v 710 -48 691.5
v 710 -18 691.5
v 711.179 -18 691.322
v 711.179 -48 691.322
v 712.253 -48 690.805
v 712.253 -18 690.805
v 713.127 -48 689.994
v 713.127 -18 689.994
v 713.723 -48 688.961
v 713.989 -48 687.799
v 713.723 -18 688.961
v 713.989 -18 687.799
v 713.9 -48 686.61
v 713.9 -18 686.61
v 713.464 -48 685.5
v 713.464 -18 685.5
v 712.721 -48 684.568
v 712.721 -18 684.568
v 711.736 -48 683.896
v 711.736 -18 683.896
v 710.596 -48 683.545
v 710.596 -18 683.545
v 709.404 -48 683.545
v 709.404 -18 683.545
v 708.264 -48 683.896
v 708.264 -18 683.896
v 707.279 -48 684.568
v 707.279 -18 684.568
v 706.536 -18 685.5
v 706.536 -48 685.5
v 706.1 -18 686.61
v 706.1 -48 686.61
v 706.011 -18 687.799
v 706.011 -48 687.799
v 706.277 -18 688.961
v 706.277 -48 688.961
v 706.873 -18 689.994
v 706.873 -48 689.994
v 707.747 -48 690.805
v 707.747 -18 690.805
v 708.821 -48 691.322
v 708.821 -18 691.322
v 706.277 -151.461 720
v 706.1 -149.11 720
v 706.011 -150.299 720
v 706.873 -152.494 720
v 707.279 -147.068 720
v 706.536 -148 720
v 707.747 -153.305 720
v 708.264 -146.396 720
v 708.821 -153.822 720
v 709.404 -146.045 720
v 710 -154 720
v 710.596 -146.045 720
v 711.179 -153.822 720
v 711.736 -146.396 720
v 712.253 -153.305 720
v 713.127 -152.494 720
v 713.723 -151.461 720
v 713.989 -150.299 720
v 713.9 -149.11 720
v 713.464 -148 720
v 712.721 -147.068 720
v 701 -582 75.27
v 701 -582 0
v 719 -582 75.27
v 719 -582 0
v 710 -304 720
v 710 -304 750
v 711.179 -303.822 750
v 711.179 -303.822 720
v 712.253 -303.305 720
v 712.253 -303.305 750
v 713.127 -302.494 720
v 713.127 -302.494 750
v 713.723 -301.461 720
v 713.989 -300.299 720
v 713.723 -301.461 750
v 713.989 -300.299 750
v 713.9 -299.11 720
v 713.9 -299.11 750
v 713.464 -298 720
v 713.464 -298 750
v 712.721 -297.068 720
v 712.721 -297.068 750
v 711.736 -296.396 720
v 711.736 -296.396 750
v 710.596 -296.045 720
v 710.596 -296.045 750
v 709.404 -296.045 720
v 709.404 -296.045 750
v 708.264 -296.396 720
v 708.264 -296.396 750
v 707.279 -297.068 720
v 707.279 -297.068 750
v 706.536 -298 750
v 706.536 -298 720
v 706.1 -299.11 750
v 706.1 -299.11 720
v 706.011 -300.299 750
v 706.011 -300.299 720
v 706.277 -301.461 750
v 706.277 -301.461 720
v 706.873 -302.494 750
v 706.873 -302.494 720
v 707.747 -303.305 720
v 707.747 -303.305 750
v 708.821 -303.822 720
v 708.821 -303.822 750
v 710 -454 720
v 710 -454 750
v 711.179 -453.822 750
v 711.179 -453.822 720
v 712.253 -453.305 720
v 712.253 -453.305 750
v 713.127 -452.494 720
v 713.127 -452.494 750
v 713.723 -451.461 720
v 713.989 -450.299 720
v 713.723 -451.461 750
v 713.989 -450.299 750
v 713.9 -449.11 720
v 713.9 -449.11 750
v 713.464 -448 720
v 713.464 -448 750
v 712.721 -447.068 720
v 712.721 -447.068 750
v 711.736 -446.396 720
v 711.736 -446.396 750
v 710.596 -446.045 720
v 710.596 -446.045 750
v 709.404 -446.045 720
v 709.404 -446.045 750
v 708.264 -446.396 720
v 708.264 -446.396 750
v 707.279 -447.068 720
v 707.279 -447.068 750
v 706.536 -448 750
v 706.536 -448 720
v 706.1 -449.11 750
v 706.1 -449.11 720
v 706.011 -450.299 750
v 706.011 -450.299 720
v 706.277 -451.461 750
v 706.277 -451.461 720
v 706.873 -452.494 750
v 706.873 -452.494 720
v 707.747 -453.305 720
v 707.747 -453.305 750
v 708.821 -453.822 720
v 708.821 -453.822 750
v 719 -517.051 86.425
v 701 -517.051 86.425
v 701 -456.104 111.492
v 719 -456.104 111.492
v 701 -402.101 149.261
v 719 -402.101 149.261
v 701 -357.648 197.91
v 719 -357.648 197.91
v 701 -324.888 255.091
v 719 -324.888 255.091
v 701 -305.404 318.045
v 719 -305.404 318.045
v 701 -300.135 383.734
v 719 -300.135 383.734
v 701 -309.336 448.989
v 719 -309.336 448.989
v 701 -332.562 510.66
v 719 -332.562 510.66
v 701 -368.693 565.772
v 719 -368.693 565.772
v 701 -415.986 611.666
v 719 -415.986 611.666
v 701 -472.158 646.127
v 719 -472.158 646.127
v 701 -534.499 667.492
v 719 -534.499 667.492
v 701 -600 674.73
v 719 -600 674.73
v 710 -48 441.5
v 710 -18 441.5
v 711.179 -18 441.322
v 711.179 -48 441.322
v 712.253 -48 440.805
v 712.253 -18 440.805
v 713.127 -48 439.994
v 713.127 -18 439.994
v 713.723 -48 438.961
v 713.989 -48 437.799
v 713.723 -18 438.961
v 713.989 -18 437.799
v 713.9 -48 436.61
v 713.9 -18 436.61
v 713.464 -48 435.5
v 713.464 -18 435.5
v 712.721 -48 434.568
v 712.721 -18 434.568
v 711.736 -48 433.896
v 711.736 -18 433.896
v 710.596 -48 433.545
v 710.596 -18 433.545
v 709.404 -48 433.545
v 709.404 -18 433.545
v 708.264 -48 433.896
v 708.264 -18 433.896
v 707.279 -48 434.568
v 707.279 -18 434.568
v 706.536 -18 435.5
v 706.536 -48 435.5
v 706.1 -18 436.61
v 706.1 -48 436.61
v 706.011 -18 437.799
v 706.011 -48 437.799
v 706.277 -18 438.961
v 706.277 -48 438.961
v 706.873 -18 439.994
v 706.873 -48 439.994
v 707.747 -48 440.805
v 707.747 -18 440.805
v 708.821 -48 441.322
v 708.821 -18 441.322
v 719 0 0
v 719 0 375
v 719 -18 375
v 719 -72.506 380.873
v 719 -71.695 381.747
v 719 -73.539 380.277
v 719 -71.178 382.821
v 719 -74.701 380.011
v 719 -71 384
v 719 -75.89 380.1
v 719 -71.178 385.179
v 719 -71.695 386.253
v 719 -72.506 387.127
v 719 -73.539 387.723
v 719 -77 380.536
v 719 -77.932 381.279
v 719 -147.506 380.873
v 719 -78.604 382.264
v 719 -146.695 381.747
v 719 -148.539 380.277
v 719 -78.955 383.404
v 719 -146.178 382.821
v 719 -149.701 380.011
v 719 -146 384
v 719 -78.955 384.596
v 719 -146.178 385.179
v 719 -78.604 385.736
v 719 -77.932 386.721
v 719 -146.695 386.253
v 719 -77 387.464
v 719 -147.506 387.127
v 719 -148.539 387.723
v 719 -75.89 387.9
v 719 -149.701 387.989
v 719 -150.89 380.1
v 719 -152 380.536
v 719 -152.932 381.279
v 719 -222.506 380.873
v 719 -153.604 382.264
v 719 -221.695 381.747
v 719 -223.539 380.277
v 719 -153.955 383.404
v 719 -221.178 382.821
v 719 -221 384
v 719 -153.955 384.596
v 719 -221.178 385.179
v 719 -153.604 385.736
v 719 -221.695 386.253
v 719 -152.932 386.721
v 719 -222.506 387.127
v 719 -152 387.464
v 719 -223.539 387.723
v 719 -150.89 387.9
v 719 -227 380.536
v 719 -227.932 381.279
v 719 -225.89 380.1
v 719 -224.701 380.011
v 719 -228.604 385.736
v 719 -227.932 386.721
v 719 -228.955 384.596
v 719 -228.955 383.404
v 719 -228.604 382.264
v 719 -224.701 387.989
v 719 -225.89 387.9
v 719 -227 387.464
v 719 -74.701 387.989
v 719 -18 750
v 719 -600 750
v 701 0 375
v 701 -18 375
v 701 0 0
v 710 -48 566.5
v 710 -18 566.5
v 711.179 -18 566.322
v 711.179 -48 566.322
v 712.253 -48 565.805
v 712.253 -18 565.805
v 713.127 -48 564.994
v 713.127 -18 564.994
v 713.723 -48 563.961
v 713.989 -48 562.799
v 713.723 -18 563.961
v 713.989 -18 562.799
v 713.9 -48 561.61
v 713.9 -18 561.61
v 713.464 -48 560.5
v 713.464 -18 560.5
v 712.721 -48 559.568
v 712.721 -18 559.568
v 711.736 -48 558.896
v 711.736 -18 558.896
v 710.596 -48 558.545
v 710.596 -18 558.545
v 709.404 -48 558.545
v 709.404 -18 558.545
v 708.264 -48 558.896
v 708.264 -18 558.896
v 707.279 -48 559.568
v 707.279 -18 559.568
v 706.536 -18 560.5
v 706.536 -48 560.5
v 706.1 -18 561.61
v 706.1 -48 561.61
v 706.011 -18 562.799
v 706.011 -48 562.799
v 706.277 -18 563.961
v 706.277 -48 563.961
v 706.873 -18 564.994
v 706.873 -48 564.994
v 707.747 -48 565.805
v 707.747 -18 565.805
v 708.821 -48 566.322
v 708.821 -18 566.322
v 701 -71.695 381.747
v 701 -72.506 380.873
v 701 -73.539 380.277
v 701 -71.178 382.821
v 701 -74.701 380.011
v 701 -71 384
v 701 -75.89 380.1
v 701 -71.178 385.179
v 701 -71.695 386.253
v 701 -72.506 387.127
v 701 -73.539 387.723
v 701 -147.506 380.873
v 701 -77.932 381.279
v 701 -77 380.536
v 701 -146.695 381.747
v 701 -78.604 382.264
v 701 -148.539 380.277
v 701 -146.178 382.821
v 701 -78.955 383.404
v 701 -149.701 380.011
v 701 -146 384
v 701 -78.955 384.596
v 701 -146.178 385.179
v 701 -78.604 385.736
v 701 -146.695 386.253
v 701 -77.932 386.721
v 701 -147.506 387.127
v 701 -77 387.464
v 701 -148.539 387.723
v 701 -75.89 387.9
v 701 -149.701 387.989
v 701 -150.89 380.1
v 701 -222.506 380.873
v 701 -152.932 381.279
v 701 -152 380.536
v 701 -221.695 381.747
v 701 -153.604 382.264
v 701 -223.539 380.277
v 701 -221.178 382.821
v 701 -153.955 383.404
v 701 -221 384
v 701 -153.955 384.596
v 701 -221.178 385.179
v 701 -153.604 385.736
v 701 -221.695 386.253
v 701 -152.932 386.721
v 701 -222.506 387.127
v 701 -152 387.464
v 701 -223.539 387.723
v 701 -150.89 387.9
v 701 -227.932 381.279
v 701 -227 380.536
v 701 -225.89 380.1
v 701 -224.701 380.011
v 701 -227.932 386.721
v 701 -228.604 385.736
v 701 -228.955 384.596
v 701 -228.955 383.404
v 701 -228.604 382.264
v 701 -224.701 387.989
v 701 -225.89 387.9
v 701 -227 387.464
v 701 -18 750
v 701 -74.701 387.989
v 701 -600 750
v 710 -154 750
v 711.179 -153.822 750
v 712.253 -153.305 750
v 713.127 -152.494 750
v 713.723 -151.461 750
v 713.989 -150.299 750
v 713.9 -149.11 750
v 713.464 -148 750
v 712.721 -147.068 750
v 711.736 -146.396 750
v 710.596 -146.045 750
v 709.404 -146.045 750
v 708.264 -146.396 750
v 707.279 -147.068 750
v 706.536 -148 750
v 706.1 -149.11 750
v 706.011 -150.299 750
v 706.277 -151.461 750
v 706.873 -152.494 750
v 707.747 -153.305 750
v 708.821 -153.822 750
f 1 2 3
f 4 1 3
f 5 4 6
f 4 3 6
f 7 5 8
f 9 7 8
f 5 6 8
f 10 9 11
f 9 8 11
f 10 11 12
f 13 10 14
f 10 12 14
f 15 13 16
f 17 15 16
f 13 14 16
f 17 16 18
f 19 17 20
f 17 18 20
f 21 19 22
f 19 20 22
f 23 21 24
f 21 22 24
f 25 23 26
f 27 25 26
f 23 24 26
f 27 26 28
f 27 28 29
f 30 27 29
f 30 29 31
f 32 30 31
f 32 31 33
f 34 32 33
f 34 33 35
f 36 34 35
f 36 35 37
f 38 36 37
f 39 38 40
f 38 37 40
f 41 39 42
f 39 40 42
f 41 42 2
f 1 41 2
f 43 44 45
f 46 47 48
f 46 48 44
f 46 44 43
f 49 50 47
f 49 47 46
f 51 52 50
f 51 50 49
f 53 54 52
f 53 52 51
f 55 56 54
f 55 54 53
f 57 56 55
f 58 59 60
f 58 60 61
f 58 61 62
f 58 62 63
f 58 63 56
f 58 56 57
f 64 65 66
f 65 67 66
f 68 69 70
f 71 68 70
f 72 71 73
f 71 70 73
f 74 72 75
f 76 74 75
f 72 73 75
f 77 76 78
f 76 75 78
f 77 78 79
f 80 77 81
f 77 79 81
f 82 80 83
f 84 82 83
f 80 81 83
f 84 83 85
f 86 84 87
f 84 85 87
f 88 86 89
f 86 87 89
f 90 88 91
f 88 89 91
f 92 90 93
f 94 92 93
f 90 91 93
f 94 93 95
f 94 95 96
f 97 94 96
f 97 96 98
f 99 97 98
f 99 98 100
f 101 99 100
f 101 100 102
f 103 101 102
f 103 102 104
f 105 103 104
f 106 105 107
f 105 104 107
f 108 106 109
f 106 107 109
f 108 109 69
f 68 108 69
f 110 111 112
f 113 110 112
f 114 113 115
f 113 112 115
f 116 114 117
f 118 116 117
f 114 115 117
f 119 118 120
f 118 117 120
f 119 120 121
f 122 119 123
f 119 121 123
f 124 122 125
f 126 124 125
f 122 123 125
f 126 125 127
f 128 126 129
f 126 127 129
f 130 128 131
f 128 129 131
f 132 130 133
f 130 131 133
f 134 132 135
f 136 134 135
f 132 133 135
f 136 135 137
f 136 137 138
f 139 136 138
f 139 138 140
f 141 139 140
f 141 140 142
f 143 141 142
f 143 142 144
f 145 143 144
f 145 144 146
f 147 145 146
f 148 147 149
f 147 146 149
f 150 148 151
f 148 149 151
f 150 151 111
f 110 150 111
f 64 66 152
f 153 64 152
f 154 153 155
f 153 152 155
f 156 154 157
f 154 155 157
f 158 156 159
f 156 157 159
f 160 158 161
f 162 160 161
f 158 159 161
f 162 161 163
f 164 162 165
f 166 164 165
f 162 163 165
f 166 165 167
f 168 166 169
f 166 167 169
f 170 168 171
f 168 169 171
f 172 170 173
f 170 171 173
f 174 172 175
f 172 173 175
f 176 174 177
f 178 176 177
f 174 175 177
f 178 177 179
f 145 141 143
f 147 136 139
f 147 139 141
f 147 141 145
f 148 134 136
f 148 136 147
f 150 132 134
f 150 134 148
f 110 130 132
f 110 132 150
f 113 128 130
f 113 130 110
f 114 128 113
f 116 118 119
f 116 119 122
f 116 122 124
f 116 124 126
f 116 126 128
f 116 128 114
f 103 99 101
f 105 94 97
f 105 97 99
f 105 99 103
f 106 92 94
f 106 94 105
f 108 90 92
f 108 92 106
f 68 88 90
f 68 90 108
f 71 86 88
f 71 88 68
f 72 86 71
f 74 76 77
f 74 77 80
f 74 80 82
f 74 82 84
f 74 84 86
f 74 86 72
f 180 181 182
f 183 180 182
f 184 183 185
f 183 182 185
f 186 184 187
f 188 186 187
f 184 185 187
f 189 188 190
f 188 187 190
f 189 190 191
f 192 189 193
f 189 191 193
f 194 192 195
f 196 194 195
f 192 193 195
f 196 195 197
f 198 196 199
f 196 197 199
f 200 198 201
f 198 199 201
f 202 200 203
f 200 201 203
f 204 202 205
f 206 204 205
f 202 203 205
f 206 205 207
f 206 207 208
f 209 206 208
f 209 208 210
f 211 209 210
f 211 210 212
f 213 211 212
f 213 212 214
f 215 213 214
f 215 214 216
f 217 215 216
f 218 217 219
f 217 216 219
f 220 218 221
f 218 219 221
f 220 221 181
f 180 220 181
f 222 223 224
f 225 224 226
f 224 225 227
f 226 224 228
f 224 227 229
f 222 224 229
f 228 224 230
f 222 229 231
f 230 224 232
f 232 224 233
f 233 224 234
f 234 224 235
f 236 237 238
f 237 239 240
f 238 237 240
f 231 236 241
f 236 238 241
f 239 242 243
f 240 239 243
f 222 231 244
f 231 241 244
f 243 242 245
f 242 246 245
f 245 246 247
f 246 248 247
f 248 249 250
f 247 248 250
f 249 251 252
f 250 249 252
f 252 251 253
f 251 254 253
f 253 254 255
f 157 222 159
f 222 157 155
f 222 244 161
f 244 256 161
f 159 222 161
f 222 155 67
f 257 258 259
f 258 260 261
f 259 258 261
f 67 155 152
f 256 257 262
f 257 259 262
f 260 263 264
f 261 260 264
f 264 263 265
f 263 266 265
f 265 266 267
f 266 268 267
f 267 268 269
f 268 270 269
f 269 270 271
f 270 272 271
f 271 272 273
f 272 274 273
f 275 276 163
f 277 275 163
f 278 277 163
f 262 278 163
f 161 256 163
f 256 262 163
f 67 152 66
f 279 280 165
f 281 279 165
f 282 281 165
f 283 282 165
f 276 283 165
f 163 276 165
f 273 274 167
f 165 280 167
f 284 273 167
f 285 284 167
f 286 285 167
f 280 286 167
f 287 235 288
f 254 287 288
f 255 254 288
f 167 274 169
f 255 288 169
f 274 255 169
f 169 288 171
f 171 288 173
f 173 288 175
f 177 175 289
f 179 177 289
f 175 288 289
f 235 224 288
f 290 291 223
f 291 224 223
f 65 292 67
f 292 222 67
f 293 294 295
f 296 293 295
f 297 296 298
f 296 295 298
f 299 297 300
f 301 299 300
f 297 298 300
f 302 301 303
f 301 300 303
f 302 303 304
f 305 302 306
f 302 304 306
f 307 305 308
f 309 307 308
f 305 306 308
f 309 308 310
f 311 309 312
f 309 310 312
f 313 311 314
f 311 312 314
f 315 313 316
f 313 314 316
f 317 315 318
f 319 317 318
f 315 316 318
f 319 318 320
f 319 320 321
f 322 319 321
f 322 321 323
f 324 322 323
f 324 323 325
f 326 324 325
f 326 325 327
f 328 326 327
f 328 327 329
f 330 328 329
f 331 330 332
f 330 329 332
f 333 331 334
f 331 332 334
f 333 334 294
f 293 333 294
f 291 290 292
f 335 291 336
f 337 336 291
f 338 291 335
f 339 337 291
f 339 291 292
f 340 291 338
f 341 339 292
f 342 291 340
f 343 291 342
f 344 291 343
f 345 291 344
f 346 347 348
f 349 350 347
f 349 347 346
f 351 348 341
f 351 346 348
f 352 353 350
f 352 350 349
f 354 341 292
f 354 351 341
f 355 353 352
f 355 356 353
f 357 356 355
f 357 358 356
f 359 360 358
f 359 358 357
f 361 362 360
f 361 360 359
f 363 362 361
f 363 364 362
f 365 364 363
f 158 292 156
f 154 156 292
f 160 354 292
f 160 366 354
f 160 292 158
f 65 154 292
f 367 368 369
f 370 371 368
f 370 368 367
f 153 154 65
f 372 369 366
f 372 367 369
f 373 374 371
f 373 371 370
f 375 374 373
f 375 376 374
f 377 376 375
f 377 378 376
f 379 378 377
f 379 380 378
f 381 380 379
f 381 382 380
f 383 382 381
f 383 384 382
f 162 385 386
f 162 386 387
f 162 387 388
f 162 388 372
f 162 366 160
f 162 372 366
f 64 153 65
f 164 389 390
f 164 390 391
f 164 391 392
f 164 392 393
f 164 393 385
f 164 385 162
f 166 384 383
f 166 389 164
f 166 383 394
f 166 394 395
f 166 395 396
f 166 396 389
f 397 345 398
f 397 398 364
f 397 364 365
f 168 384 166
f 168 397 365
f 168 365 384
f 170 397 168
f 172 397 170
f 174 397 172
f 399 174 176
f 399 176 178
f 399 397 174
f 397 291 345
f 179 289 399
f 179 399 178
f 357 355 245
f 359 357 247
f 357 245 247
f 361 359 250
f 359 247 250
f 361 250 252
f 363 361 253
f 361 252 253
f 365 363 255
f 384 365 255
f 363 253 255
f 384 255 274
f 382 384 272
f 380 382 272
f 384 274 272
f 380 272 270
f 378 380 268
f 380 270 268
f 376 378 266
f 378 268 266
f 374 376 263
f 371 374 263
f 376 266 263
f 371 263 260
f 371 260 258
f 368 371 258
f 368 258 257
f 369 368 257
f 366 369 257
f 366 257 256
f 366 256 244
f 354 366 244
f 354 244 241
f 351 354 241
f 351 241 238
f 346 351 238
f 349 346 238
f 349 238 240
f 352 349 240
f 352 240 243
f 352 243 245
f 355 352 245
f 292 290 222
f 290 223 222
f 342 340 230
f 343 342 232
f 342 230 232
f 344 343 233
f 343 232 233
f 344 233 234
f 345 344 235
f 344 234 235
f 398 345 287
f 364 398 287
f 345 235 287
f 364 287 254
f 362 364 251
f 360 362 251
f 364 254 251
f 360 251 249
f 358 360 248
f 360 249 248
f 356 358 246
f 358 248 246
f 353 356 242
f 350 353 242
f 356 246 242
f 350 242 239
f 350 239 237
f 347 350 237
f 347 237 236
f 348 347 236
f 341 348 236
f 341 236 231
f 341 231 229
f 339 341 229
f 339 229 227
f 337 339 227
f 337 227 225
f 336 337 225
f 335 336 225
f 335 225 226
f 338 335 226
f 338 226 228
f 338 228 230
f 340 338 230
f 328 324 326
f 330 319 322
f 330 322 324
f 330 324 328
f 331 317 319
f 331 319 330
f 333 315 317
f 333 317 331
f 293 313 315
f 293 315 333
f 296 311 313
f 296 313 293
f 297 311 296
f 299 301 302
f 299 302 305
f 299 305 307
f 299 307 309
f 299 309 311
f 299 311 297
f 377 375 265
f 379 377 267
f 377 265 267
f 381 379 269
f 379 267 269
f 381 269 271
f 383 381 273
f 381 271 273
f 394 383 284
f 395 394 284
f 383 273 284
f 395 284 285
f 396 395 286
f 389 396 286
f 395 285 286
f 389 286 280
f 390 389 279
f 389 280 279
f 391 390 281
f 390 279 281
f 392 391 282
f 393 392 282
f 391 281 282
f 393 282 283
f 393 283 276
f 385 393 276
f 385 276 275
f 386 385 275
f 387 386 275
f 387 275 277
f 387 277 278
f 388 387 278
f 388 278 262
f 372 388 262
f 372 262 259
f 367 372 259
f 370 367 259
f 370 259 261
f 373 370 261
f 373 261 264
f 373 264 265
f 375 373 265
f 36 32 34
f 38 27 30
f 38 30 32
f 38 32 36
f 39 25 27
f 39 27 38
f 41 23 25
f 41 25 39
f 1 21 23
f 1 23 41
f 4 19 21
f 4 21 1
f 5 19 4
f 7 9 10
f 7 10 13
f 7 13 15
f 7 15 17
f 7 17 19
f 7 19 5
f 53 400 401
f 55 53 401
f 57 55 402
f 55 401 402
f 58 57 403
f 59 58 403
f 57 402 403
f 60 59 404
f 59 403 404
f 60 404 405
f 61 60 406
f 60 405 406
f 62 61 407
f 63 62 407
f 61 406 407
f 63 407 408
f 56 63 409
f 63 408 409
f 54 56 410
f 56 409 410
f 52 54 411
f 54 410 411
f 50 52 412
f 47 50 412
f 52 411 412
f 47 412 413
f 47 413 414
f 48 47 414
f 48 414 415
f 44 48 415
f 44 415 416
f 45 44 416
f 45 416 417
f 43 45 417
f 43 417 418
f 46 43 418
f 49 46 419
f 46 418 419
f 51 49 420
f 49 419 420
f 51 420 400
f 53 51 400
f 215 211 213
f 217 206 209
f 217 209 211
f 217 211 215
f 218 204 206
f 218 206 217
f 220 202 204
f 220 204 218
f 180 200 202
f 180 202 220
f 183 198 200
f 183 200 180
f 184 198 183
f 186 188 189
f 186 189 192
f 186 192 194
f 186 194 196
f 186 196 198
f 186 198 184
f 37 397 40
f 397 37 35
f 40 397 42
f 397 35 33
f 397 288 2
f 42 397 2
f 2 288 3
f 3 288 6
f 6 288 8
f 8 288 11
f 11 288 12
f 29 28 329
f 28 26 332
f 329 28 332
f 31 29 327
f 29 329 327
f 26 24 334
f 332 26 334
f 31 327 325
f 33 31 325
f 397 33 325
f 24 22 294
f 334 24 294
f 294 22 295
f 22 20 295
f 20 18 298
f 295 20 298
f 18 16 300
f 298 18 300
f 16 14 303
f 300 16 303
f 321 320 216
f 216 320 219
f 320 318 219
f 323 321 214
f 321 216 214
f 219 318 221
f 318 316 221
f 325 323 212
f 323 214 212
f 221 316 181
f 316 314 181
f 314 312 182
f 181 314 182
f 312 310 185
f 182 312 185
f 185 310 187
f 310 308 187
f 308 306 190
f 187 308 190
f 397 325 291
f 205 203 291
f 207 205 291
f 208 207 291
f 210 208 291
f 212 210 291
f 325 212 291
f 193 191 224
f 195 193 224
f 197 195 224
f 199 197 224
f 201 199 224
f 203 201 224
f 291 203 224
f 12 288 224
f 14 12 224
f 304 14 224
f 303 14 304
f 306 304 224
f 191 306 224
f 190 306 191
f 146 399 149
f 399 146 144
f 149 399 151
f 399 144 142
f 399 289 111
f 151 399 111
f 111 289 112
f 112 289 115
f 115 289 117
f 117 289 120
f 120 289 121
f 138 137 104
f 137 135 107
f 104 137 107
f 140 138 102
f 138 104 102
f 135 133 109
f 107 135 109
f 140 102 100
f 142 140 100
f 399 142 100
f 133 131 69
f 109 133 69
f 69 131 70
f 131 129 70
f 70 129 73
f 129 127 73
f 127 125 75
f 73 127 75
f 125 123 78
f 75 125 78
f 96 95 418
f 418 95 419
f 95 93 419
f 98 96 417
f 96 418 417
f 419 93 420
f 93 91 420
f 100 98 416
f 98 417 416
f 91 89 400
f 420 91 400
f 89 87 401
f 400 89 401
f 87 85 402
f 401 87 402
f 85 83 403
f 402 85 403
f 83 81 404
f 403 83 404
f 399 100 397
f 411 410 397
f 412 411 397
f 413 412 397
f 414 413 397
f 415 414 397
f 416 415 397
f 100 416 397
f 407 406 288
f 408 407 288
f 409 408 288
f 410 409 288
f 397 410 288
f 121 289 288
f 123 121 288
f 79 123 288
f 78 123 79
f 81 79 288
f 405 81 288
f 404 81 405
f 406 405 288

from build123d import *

# Parameters (mm, degrees)
PAD023_DEPTH    = 9
SKETCH069_R     = 4
POCKET020_DEPTH = 30
SKETCH072_R     = 4
POCKET023_DEPTH = 30
SKETCH073_R     = 4
POCKET024_DEPTH = 18.001


with BuildPart() as part:
    # Sketch065 → Pad023 (new body, symmetric)
    with BuildSketch(Plane.YZ):
        with BuildLine():
            Line((-600, 750), (-18, 750))
            Line((-18, 750), (-18, 375))
            Line((-18, 375), (0, 375))
            Line((0, 375), (0, 0))
            Line((0, 0), (-582, 0))
            Line((-582, 0), (-582, 75.270243))
            ThreePointArc((-582, 75.270243), (-300.135152, 383.733813), (-600, 674.729757))
            Line((-600, 750), (-600, 674.729757))
        make_face()
    extrude(amount=PAD023_DEPTH, both=True)

    # Sketch069 (on Face1 of Pad023) → Pocket020 (cut)
    with BuildSketch(Plane(origin=(0, 0, 750), x_dir=(0, -1, 0), z_dir=(0, 0, 1))):
        with Locations((150, 0)):
            Circle(SKETCH069_R)
        with Locations((300, 0)):
            Circle(SKETCH069_R)
        with Locations((450, 0)):
            Circle(SKETCH069_R)
    extrude(amount=-POCKET020_DEPTH, mode=Mode.SUBTRACT)

    # Sketch072 (on Face5 of Pocket020) → Pocket023 (cut)
    with BuildSketch(Plane.ZX.offset(-18)):
        with Locations((437.5, 0)):
            Circle(SKETCH072_R)
        with Locations((562.5, 0)):
            Circle(SKETCH072_R)
        with Locations((687.5, 0)):
            Circle(SKETCH072_R)
    extrude(amount=-POCKET023_DEPTH, mode=Mode.SUBTRACT)

    # Sketch073 (on Face4 of Pocket023) → Pocket024 (cut, through all)
    with BuildSketch(Plane.YZ.offset(9)):
        with Locations((-150, 384)):
            Circle(SKETCH073_R)
        with Locations((-225, 384)):
            Circle(SKETCH073_R)
        with Locations((-75, 384)):
            Circle(SKETCH073_R)
    extrude(amount=-POCKET024_DEPTH, mode=Mode.SUBTRACT)


with BuildPart() as part_1:
    # Body018001001001010001003001003001001019 placement: moved
    add(part.part.moved(Location((-710, 0, 0))))


with BuildPart() as part_2:
    # Clone014 placement: moved
    add(part_1.part.moved(Location((1420, 0, 0))))


solid = part_2.part
